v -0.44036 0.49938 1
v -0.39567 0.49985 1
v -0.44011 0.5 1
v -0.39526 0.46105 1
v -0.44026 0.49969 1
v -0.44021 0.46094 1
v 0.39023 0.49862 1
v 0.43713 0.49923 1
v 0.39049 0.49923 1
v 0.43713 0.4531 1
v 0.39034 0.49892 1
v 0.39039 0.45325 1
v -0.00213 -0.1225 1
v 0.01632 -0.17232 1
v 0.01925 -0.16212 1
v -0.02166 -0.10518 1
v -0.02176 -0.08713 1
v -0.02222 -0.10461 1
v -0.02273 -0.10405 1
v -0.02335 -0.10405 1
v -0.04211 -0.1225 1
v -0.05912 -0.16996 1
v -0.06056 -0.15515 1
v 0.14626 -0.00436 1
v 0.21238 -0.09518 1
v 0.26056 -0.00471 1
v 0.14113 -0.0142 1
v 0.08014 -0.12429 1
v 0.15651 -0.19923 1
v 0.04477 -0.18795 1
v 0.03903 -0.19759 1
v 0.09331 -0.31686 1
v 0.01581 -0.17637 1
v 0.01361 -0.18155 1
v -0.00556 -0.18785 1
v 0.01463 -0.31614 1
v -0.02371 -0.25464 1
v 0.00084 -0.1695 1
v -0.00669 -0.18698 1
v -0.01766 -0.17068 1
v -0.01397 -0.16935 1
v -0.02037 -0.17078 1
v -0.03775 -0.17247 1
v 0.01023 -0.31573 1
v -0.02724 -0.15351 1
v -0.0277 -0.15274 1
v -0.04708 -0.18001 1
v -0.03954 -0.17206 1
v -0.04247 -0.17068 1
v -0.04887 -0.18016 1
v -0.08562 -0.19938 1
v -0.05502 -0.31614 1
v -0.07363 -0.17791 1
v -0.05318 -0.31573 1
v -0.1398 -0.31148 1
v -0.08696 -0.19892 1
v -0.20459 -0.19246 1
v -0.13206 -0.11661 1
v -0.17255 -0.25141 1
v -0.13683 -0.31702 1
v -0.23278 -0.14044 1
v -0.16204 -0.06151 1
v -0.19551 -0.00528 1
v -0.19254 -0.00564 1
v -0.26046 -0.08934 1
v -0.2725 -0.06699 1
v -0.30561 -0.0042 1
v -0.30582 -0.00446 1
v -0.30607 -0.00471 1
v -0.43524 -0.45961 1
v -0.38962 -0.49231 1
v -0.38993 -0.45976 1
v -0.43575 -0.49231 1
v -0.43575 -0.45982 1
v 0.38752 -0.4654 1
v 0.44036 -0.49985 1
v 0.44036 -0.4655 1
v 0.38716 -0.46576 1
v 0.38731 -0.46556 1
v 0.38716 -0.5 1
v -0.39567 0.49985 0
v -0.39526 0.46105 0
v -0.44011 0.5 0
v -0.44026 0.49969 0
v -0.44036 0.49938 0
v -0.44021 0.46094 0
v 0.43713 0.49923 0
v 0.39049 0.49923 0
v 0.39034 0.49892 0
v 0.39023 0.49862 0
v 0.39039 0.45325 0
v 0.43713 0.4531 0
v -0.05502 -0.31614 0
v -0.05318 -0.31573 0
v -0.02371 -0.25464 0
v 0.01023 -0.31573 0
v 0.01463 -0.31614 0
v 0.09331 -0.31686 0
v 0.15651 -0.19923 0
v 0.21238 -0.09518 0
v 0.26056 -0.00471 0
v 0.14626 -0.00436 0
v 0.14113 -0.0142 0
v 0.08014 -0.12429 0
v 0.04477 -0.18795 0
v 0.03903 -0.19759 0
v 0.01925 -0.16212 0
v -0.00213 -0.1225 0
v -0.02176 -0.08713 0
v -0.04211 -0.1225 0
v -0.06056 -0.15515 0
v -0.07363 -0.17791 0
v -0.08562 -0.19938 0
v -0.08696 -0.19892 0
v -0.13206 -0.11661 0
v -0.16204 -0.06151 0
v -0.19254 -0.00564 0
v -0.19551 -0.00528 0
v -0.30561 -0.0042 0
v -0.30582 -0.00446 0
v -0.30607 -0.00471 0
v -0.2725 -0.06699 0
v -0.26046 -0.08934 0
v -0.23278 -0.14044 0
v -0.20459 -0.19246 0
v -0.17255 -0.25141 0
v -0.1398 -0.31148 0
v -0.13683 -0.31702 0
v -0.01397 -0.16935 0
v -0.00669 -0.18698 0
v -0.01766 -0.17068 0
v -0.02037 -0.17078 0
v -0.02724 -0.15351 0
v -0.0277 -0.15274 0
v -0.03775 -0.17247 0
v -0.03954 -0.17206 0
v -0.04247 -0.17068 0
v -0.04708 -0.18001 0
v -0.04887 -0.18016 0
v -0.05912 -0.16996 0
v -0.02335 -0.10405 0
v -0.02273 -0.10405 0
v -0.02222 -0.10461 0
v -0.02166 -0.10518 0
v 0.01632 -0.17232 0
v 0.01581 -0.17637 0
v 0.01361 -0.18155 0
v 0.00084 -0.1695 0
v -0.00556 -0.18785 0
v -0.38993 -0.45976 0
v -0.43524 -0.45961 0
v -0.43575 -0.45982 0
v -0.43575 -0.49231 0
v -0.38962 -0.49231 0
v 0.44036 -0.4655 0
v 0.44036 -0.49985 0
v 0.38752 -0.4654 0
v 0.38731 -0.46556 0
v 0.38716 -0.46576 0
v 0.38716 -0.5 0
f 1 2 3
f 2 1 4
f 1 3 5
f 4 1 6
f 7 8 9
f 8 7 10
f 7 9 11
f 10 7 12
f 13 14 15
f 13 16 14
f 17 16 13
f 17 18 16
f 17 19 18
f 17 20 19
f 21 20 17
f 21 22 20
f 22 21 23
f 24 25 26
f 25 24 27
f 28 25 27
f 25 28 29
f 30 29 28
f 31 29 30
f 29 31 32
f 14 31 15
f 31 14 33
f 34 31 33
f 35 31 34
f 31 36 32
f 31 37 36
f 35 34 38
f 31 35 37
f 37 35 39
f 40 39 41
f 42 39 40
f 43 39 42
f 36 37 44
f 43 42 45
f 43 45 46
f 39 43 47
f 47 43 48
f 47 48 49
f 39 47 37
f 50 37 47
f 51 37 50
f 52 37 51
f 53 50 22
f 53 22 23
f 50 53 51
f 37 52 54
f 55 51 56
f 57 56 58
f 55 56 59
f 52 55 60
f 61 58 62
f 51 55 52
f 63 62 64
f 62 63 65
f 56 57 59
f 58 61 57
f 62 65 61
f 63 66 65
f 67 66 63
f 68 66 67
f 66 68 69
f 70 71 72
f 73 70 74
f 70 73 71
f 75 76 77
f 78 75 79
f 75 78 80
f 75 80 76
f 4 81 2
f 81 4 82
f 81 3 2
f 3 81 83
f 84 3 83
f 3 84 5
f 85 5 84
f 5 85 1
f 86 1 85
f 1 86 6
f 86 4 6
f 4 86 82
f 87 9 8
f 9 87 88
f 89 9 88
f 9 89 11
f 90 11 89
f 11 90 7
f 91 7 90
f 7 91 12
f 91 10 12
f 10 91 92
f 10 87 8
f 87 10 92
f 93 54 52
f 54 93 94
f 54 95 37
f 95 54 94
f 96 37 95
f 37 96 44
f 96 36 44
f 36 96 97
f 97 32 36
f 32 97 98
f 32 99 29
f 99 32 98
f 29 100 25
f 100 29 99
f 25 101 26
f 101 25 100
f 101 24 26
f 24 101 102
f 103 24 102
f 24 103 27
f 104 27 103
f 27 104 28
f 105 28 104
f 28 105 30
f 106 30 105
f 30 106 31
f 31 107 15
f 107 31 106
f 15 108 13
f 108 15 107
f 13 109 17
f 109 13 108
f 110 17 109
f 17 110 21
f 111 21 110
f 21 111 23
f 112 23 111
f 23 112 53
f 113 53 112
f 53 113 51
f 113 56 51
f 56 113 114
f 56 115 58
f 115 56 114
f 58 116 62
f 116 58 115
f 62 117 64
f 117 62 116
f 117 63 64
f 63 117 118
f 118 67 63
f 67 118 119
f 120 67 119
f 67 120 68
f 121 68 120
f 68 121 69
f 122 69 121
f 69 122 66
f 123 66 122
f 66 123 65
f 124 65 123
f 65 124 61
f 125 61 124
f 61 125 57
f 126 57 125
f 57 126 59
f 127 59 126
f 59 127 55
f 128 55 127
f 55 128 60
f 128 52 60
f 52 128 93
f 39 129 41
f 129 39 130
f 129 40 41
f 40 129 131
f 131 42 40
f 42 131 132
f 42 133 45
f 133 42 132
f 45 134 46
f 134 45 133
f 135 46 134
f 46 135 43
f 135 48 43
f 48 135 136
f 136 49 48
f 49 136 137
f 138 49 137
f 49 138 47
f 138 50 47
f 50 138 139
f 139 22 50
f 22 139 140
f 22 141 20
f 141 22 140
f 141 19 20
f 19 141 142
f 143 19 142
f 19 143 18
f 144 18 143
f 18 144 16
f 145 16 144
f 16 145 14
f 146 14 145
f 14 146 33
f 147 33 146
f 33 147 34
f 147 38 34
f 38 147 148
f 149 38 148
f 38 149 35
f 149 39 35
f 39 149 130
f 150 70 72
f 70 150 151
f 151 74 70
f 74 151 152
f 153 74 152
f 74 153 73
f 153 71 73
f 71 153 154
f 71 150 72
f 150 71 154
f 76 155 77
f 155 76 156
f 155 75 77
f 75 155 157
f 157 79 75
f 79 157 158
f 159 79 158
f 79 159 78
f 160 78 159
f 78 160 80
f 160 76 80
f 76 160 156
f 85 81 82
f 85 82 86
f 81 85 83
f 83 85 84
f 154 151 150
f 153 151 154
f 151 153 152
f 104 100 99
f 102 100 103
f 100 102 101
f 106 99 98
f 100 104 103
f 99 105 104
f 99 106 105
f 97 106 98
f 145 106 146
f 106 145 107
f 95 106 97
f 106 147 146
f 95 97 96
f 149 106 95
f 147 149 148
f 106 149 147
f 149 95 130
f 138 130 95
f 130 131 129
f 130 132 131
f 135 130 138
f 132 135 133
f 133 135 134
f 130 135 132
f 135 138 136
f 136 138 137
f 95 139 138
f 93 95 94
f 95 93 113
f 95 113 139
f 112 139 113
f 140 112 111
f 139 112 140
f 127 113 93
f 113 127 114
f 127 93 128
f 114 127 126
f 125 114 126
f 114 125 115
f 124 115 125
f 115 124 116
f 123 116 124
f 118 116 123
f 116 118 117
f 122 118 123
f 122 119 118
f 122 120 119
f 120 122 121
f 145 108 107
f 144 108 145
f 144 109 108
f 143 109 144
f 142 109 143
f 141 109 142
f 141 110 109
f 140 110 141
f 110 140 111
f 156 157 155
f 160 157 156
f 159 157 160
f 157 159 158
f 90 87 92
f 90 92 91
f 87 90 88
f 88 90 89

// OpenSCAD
module WibbyW_1()
{
 /* Generated by trace2scad version 20150415
    http://aggregate.org/MAKE/TRACE2SCAD/
    Optimized model has 81/1762 original points
 */
 color([0.5, 0.5, 0.5])
 assign(minx=285) /* polygon minx=285 */
 assign(miny=200) /* polygon miny=200 */
 assign(maxx=17468) /* polygon maxx=17468 */
 assign(maxy=19710) /* polygon maxy=19710 */
 assign(dx=maxx-minx)
 assign(dy=maxy-miny)
 assign(maxd=((dx>dy)?dx:dy))
 scale([1/maxd, 1/maxd, 1])
 translate([-minx-dx/2, -miny-dy/2, 0])
 linear_extrude(height=1, convexity=81)
 union() {
  union() {
   polygon([[287,19704],[285,19698],[288,18948],[1165,18950],[1157,19707],[290,19710]], convexity=6);
   polygon([[16492,19689],[16490,19683],[16493,18798],[17405,18795],[17405,19695],[16495,19695]], convexity=6);
   union() {
    difference() {
     polygon([[2910,9868],[2905,9863],[3560,8648],[3795,8212],[4335,7215],[4885,6200],[5510,5050],[6149,3878],[6207,3770],[7803,3787],[7839,3795],[8414,4987],[9076,3795],[9162,3787],[10697,3773],[11930,6068],[13020,8098],[13960,9863],[11730,9870],[11630,9678],[10440,7530],[9750,6288],[9638,6100],[9252,6792],[8835,7565],[8452,8255],[8055,7565],[7695,6928],[7440,6484],[7206,6065],[7180,6074],[6300,7680],[5715,8755],[5120,9845],[5062,9852],[2914,9873]], convexity=12);
     polygon([[8443,7914],[8454,7903],[9195,6593],[9185,6514],[9142,6413],[8893,6648],[8768,6290],[8746,6307],[8604,6651],[8532,6625],[8479,6623],[8345,6960],[8336,6975],[8140,6590],[8105,6598],[8048,6625],[7958,6443],[7923,6440],[7723,6639],[8421,7925],[8433,7925]], convexity=14);
    }
   }
   polygon([[380,986],[375,984],[375,350],[1275,350],[1269,985],[385,988]], convexity=6);
   polygon([[16433,872],[16430,868],[16430,200],[17468,203],[17468,873],[16437,875]], convexity=6);
  }
 }
}

module WibbyW()
{
 /* all layers combined, scaled to within a 1mm cube */
 scale([1, 1, 1/1])
 difference() {
  union() {
   scale([1,1,2]) translate([0,0,-0.5]) WibbyW_1();
  }
  translate([0,0,-2]) cube([2,2,4],center=true);
 }
}
WibbyW();
